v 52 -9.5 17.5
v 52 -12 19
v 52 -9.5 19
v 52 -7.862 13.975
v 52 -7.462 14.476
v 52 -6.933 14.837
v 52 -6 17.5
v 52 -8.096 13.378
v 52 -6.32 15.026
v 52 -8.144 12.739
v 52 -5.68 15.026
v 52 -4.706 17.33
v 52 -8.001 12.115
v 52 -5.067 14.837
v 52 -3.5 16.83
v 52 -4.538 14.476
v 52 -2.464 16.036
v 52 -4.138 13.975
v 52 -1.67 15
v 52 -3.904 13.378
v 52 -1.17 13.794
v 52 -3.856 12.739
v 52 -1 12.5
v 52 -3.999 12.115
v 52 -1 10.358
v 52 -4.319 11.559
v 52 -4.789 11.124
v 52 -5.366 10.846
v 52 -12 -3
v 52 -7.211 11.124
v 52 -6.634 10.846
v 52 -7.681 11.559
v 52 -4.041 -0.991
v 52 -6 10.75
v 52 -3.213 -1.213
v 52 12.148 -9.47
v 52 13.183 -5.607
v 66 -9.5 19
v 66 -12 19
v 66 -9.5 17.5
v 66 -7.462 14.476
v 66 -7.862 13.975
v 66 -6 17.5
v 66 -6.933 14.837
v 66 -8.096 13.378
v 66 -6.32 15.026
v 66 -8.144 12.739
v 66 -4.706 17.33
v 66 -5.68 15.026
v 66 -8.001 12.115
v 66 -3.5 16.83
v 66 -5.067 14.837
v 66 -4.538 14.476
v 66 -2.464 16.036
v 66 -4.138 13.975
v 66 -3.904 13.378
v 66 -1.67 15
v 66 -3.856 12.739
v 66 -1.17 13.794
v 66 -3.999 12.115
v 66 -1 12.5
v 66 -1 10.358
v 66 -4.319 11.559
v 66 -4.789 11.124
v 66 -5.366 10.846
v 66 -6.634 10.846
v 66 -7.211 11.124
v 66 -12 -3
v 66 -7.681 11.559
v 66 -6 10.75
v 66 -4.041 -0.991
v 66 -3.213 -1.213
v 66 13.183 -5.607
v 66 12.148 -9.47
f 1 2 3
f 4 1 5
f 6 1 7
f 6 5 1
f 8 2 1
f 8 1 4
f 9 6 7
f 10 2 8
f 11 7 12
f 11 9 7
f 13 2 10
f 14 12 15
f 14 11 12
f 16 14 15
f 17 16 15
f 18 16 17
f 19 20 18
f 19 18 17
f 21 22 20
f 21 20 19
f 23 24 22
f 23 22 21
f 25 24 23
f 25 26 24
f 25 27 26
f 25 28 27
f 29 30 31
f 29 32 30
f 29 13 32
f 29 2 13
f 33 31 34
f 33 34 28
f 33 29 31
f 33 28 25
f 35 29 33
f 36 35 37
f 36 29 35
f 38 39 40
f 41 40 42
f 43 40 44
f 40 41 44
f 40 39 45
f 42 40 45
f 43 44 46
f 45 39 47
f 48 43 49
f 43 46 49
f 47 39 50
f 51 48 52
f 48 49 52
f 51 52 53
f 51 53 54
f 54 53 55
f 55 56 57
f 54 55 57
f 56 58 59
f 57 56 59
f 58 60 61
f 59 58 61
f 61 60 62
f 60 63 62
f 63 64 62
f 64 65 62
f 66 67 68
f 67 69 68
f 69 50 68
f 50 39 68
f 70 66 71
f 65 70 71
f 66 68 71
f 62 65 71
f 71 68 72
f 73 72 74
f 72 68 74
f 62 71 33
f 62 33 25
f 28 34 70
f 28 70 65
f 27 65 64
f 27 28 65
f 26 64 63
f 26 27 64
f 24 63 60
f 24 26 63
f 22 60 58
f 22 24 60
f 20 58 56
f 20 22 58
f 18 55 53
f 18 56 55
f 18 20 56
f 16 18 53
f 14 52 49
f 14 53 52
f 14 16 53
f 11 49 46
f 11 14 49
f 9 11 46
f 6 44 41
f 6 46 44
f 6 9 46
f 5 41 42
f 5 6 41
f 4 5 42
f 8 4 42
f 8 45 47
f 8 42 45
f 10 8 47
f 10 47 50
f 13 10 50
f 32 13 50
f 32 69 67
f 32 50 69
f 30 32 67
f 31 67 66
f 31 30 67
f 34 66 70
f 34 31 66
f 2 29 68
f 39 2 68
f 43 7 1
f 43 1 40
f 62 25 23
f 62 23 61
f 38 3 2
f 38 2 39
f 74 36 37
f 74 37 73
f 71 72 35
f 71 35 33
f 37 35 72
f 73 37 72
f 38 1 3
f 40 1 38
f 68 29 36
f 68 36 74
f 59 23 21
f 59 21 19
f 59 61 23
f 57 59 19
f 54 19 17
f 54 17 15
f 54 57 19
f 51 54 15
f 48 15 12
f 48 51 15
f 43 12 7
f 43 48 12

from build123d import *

# Parameters (mm, degrees)
CYLINDER_R           = 2.15
CYLINDER_DEPTH       = 50
CYLINDER_PITCH_ANGLE = 90
BOX002_W             = 14
BOX002_H             = 11
BOX002_DEPTH         = 20.5
CHAMFER_SIZE         = 4
FILLET001_R          = 5
BOX003_W             = 14
BOX003_H             = 25
BOX003_DEPTH         = 4
BOX003_ROLL_ANGLE    = -15
BOX004_W             = 14
BOX004_H             = 2.5
BOX004_DEPTH         = 5
POCKET006_DEPTH      = 15


with BuildPart() as cylinder:
    # Cylinder → Cylinder (new body)
    with BuildSketch(Plane.XY):
        Circle(CYLINDER_R)
    extrude(amount=CYLINDER_DEPTH)


with BuildPart() as cylinder_1:
    # Cylinder pitch: moved
    add(cylinder.part.rotate(Axis((0, 0, 0), (0, 1, 0)), CYLINDER_PITCH_ANGLE))


with BuildPart() as cylinder_2:
    # Cylinder placement: moved
    add(cylinder_1.part.moved(Location((31, -6, 12.9))))


with BuildPart() as fillet001:
    # Box002 → Box002 (new body)
    with BuildSketch(Plane(origin=(52, -12, -3), x_dir=(1, 0, 0), z_dir=(0, 0, 1))):
        with Locations((7, 5.5)):
            Rectangle(BOX002_W, BOX002_H)
    extrude(amount=BOX002_DEPTH)

    # Chamfer
    chamfer_edges = [fillet001.edges().sort_by_distance(p)[0] for p in [
        (59, -1, -3),
    ]]
    chamfer(chamfer_edges, length=CHAMFER_SIZE)

    # Fillet001
    fillet001_edges = [fillet001.edges().sort_by_distance(p)[0] for p in [
        (59, -1, 17.5),
    ]]
    fillet(fillet001_edges, radius=FILLET001_R)


with BuildPart() as cube002:
    # Box003 → Box003 (new body)
    with BuildSketch(Plane.XY):
        with Locations((7, 12.5)):
            Rectangle(BOX003_W, BOX003_H)
    extrude(amount=BOX003_DEPTH)


with BuildPart() as cube002_1:
    # Box003 roll: moved
    add(cube002.part.rotate(Axis((0, 0, 0), (1, 0, 0)), BOX003_ROLL_ANGLE))


with BuildPart() as cube002_2:
    # Box003 placement: moved
    add(cube002_1.part.moved(Location((52, -12, -3))))


with BuildPart() as enganche001:
    # Box004 → Box004 (new body)
    with BuildSketch(Plane(origin=(52, -12, 14), x_dir=(1, 0, 0), z_dir=(0, 0, 1))):
        with Locations((7, 1.25)):
            Rectangle(BOX004_W, BOX004_H)
    extrude(amount=BOX004_DEPTH)

    # Fusion: union Fillet001, Cube002
    add(fillet001.part)
    add(cube002_2.part)

    # Cut001: cut Cylinder
    add(cylinder_2.part, mode=Mode.SUBTRACT)

    # Sketch006 → Pocket006 (cut)
    with BuildSketch(Plane.YZ.offset(66)):
        Polygon((13.183422, -5.606773), (-4.041064, -0.991486), (-0.407217, 12.570217), align=None)
    extrude(amount=-POCKET006_DEPTH, mode=Mode.SUBTRACT)


solid = enganche001.part
